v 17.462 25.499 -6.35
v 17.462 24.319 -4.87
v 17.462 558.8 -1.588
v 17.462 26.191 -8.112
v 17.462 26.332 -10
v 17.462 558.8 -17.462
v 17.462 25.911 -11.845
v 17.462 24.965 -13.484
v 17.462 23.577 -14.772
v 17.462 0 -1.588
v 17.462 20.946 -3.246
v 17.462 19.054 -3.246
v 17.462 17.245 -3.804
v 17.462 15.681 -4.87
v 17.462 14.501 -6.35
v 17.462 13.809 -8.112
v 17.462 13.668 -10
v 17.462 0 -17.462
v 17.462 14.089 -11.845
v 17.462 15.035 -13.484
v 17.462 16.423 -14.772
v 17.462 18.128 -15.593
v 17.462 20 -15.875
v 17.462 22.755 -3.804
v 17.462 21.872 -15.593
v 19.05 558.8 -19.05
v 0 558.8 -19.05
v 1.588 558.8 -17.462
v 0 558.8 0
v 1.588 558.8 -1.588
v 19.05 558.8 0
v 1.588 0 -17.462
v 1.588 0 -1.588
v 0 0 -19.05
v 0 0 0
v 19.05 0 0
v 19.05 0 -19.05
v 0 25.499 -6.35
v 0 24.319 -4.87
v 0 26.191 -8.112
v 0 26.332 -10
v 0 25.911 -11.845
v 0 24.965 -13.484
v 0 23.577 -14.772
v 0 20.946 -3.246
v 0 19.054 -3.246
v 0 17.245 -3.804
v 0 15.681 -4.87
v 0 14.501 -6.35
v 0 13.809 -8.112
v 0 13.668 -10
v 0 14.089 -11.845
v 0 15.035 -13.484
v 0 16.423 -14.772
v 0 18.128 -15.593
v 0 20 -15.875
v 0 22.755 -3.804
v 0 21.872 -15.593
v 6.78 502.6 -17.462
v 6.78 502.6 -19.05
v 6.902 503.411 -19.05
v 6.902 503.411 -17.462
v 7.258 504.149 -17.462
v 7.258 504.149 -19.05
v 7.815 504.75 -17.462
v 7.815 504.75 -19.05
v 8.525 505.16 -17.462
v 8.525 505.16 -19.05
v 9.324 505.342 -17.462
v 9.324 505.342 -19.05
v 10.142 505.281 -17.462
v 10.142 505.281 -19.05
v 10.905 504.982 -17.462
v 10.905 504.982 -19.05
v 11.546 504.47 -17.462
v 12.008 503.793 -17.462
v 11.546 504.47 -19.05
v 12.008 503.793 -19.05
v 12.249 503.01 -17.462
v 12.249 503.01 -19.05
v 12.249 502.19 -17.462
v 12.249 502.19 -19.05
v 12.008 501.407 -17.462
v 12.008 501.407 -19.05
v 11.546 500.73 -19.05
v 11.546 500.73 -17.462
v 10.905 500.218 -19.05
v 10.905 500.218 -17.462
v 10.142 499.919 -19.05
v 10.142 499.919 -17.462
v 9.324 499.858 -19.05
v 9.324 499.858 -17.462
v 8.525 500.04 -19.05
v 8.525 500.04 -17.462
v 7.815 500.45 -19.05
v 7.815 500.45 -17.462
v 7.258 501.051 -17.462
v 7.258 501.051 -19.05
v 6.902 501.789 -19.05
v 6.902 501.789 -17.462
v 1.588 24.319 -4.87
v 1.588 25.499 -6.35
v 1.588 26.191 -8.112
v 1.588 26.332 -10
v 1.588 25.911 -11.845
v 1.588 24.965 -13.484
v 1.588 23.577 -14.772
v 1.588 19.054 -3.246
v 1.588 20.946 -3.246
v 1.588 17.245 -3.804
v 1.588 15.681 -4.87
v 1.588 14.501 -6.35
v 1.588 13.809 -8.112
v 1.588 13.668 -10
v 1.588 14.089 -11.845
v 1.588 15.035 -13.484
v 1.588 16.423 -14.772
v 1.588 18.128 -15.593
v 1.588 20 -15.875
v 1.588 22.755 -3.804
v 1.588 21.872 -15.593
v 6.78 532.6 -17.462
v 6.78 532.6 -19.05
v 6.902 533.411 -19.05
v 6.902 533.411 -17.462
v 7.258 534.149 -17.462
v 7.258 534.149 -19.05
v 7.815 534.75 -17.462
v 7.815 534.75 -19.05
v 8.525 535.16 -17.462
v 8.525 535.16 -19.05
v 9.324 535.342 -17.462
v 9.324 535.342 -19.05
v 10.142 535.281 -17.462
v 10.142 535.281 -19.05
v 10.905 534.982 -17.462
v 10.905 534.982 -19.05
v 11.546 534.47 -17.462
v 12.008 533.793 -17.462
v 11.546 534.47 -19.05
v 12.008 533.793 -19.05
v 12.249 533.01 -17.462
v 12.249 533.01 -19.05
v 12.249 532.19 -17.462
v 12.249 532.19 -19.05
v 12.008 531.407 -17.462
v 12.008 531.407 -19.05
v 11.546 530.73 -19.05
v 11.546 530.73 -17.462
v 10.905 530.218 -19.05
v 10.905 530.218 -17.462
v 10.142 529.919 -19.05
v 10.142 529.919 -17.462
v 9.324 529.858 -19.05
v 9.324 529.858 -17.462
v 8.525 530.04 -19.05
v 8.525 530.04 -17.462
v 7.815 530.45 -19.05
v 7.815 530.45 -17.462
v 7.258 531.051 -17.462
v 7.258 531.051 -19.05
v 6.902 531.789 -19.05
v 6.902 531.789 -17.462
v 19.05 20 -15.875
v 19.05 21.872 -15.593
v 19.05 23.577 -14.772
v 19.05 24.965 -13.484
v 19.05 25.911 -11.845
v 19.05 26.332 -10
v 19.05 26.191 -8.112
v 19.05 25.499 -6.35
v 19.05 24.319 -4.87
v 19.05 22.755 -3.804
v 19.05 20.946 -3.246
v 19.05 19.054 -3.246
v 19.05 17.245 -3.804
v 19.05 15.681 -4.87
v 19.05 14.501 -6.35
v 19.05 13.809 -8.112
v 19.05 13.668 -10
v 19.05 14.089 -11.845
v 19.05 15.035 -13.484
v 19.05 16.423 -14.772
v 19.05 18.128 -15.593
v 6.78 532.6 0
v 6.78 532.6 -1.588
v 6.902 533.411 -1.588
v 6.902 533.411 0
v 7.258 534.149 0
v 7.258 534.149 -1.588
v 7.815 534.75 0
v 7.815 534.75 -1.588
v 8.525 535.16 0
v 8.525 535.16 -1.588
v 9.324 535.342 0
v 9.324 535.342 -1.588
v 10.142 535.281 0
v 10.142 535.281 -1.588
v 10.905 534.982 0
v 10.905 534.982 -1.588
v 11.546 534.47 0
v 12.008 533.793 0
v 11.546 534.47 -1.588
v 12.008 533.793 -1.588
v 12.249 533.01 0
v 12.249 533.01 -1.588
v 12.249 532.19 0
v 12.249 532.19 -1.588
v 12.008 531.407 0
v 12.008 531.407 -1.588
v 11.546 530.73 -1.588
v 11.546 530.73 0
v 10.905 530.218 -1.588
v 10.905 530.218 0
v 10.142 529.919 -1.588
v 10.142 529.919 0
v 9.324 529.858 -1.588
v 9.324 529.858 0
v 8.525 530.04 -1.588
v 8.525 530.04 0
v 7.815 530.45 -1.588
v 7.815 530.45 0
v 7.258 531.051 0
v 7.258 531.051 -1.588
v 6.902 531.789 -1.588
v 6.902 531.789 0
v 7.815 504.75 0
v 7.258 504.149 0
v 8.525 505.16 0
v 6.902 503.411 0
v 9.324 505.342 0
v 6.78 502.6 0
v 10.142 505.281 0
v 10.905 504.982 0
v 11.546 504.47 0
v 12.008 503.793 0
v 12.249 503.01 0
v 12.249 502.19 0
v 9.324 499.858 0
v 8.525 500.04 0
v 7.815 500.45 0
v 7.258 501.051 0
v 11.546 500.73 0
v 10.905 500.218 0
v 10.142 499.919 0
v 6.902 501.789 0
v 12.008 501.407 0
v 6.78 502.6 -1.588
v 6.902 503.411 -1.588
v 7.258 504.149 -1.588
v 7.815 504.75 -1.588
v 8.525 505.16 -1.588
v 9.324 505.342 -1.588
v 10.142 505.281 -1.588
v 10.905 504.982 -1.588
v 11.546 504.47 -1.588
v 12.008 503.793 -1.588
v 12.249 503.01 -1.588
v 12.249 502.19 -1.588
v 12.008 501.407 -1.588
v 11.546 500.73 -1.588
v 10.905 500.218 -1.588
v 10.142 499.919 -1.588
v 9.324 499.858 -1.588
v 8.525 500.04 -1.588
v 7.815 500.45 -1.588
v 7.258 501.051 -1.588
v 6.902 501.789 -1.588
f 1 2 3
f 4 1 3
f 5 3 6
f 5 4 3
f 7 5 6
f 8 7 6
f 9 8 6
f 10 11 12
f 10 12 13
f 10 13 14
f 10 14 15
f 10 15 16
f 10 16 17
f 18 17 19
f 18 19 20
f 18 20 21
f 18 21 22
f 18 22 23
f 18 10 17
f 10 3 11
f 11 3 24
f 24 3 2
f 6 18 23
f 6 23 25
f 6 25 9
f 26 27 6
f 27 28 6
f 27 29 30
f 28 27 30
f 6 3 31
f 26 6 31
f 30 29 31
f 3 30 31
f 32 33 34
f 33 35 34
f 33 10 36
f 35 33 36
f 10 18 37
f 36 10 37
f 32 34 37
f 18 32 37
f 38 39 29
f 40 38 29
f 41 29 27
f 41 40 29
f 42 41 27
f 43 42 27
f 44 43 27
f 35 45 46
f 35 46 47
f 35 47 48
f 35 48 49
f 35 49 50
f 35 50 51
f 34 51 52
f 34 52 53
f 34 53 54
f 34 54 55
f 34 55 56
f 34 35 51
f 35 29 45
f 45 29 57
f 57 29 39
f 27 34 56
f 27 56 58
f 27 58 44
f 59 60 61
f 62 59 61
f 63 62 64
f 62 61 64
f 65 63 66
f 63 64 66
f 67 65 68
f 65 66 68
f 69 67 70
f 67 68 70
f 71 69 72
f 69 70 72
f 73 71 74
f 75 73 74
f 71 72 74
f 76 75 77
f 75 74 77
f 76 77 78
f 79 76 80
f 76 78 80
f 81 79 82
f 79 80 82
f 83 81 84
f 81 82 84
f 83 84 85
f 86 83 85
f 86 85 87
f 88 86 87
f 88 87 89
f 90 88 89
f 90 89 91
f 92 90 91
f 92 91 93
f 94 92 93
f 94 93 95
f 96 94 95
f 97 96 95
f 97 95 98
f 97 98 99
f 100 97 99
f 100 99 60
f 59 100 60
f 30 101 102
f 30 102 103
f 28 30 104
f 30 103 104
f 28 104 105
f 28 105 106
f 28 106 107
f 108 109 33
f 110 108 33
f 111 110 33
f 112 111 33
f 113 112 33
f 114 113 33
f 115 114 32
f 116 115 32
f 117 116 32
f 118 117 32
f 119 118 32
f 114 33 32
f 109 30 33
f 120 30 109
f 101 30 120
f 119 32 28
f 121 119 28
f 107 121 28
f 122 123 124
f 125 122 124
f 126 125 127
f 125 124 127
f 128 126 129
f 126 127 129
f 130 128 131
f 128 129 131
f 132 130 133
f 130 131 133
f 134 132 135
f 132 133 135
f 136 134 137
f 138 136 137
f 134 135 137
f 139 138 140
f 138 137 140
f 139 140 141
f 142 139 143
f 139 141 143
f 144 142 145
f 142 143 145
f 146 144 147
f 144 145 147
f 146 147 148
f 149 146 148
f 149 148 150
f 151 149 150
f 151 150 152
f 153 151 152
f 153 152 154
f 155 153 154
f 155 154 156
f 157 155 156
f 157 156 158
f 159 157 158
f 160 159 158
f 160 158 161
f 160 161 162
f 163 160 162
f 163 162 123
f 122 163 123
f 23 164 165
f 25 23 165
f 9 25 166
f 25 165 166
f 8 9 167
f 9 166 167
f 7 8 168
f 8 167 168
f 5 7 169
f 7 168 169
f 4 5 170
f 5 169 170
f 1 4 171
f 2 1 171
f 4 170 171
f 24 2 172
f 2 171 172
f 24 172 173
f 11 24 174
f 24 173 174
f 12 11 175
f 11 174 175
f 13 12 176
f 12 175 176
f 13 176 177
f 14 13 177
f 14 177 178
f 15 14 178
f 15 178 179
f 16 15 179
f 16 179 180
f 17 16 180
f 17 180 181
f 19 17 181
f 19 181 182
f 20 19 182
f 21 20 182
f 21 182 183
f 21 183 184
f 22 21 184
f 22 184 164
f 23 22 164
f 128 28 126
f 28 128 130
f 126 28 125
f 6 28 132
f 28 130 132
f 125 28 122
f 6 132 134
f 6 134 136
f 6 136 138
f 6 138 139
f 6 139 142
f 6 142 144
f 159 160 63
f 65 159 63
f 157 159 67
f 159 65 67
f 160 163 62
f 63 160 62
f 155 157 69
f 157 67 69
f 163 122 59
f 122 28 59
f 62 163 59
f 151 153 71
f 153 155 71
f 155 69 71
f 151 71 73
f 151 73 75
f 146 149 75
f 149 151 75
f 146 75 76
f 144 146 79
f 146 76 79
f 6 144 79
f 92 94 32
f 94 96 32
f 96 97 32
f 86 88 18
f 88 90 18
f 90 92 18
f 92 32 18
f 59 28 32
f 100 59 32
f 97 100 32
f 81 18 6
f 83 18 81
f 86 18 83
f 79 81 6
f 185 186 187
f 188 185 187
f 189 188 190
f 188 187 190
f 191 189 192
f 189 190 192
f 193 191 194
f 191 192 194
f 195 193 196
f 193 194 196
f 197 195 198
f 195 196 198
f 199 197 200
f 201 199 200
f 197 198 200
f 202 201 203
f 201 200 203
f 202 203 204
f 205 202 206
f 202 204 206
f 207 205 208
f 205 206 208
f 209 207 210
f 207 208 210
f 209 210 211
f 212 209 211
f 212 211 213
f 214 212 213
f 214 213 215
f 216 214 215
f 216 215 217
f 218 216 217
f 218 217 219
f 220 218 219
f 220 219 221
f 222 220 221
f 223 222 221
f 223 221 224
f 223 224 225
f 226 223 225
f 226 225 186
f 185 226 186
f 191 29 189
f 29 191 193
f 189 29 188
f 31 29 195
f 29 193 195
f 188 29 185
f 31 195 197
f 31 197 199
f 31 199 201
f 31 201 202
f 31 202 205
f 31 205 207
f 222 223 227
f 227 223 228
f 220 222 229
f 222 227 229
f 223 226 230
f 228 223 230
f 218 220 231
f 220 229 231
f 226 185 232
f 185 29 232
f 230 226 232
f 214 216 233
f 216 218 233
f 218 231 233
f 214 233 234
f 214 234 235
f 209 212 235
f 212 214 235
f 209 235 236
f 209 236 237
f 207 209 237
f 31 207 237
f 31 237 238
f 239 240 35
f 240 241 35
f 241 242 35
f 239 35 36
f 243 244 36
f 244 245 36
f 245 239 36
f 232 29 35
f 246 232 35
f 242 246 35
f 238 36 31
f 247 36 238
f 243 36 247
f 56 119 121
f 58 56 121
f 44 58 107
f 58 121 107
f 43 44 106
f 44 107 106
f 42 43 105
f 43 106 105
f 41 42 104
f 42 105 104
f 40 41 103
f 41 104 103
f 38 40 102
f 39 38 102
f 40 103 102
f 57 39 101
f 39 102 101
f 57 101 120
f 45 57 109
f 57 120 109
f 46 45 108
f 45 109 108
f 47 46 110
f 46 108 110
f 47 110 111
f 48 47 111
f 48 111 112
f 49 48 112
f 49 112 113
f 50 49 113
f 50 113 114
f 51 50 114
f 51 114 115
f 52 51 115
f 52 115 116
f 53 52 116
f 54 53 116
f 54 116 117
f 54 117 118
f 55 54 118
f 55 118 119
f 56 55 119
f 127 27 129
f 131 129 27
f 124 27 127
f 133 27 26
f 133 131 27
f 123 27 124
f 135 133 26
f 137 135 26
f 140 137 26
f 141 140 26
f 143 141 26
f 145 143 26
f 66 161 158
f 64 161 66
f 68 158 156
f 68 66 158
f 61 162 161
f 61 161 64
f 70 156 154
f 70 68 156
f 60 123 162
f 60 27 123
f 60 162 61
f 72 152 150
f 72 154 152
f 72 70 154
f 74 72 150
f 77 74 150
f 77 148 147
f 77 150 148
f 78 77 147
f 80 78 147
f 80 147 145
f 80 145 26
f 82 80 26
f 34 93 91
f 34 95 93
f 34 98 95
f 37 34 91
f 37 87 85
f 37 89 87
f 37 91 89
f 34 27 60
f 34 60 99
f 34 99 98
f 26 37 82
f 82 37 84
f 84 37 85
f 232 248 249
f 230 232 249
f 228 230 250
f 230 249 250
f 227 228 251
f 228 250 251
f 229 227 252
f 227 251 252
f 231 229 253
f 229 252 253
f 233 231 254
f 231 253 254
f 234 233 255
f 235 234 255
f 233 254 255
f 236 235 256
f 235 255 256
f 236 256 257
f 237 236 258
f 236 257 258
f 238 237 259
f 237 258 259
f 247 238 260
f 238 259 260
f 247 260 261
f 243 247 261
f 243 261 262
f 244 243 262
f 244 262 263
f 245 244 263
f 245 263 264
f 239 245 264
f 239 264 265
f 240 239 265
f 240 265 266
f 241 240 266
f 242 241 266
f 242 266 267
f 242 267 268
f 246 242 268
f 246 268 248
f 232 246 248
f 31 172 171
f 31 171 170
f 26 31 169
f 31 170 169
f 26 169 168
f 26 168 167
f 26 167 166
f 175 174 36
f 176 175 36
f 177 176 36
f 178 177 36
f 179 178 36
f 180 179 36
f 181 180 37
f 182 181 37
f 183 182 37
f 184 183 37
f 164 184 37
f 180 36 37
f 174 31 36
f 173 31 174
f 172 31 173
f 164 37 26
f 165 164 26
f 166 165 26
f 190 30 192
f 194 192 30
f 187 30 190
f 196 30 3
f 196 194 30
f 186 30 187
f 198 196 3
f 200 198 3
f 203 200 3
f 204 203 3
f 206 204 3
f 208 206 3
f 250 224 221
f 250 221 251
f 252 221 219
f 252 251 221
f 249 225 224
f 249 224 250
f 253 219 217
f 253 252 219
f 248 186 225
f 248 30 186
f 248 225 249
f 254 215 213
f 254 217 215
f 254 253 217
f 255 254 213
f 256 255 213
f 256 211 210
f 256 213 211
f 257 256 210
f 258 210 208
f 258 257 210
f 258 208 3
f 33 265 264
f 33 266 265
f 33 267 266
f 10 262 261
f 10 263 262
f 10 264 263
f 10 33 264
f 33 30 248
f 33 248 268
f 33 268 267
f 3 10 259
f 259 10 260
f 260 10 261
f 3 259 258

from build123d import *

# Parameters (mm, degrees)
SKETCH1_W           = 19.05
SKETCH1_H           = 19.05
SKETCH1_W_2         = 15.875
SKETCH1_H_2         = 15.875
BOSS_EXTRUDE1_DEPTH = 914.4
SKETCH4_R           = 6.35
CUT_EXTRUDE3_DEPTH  = 20.05
SKETCH5_OUTSIDE_W   = 204.01
SKETCH5_OUTSIDE_H   = 1099.36
SKETCH5_OUTSIDE_W_2 = 19.05
SKETCH5_OUTSIDE_H_2 = 558.8
CUT_EXTRUDE4_DEPTH  = 20.05
SKETCH6_R           = 2.75
CUT_EXTRUDE5_DEPTH  = 20.05


with BuildPart() as part:
    # Sketch1 → Boss-Extrude1 (new body)
    with BuildSketch(Plane(origin=(0, 0, 0), x_dir=(1, 0, 0), z_dir=(0, 1, 0))):
        with Locations((9.525, 9.525)):
            Rectangle(SKETCH1_W, SKETCH1_H)
        with Locations((9.525, 9.525)):
            Rectangle(SKETCH1_W_2, SKETCH1_H_2, mode=Mode.SUBTRACT)
    extrude(amount=BOSS_EXTRUDE1_DEPTH)

    # Sketch4 → Cut-Extrude3 (cut, through all)
    with BuildSketch(Plane(origin=(19.05, 0, 0), x_dir=(0, 0, -1), z_dir=(1, 0, 0))):
        with Locations((9.525, 20)):
            Circle(SKETCH4_R)
    extrude(amount=-CUT_EXTRUDE3_DEPTH, mode=Mode.SUBTRACT)

    # Sketch5 outside → Cut-Extrude4 (cut, through all)
    with BuildSketch(Plane.XY):
        with Locations((9.525, 457.2)):
            Rectangle(SKETCH5_OUTSIDE_W, SKETCH5_OUTSIDE_H)
        with Locations((9.525, 279.4)):
            Rectangle(SKETCH5_OUTSIDE_W_2, SKETCH5_OUTSIDE_H_2, mode=Mode.SUBTRACT)
    extrude(amount=-CUT_EXTRUDE4_DEPTH, mode=Mode.SUBTRACT)

    # Sketch6 → Cut-Extrude5 (cut, through all)
    with BuildSketch(Plane(origin=(0, 0, -19.05), x_dir=(-1, 0, 0), z_dir=(0, 0, -1))):
        with Locations((-9.53, 532.6)):
            Circle(SKETCH6_R)
        with Locations((-9.53, 502.6)):
            Circle(SKETCH6_R)
    extrude(amount=-CUT_EXTRUDE5_DEPTH, mode=Mode.SUBTRACT)


solid = part.part
